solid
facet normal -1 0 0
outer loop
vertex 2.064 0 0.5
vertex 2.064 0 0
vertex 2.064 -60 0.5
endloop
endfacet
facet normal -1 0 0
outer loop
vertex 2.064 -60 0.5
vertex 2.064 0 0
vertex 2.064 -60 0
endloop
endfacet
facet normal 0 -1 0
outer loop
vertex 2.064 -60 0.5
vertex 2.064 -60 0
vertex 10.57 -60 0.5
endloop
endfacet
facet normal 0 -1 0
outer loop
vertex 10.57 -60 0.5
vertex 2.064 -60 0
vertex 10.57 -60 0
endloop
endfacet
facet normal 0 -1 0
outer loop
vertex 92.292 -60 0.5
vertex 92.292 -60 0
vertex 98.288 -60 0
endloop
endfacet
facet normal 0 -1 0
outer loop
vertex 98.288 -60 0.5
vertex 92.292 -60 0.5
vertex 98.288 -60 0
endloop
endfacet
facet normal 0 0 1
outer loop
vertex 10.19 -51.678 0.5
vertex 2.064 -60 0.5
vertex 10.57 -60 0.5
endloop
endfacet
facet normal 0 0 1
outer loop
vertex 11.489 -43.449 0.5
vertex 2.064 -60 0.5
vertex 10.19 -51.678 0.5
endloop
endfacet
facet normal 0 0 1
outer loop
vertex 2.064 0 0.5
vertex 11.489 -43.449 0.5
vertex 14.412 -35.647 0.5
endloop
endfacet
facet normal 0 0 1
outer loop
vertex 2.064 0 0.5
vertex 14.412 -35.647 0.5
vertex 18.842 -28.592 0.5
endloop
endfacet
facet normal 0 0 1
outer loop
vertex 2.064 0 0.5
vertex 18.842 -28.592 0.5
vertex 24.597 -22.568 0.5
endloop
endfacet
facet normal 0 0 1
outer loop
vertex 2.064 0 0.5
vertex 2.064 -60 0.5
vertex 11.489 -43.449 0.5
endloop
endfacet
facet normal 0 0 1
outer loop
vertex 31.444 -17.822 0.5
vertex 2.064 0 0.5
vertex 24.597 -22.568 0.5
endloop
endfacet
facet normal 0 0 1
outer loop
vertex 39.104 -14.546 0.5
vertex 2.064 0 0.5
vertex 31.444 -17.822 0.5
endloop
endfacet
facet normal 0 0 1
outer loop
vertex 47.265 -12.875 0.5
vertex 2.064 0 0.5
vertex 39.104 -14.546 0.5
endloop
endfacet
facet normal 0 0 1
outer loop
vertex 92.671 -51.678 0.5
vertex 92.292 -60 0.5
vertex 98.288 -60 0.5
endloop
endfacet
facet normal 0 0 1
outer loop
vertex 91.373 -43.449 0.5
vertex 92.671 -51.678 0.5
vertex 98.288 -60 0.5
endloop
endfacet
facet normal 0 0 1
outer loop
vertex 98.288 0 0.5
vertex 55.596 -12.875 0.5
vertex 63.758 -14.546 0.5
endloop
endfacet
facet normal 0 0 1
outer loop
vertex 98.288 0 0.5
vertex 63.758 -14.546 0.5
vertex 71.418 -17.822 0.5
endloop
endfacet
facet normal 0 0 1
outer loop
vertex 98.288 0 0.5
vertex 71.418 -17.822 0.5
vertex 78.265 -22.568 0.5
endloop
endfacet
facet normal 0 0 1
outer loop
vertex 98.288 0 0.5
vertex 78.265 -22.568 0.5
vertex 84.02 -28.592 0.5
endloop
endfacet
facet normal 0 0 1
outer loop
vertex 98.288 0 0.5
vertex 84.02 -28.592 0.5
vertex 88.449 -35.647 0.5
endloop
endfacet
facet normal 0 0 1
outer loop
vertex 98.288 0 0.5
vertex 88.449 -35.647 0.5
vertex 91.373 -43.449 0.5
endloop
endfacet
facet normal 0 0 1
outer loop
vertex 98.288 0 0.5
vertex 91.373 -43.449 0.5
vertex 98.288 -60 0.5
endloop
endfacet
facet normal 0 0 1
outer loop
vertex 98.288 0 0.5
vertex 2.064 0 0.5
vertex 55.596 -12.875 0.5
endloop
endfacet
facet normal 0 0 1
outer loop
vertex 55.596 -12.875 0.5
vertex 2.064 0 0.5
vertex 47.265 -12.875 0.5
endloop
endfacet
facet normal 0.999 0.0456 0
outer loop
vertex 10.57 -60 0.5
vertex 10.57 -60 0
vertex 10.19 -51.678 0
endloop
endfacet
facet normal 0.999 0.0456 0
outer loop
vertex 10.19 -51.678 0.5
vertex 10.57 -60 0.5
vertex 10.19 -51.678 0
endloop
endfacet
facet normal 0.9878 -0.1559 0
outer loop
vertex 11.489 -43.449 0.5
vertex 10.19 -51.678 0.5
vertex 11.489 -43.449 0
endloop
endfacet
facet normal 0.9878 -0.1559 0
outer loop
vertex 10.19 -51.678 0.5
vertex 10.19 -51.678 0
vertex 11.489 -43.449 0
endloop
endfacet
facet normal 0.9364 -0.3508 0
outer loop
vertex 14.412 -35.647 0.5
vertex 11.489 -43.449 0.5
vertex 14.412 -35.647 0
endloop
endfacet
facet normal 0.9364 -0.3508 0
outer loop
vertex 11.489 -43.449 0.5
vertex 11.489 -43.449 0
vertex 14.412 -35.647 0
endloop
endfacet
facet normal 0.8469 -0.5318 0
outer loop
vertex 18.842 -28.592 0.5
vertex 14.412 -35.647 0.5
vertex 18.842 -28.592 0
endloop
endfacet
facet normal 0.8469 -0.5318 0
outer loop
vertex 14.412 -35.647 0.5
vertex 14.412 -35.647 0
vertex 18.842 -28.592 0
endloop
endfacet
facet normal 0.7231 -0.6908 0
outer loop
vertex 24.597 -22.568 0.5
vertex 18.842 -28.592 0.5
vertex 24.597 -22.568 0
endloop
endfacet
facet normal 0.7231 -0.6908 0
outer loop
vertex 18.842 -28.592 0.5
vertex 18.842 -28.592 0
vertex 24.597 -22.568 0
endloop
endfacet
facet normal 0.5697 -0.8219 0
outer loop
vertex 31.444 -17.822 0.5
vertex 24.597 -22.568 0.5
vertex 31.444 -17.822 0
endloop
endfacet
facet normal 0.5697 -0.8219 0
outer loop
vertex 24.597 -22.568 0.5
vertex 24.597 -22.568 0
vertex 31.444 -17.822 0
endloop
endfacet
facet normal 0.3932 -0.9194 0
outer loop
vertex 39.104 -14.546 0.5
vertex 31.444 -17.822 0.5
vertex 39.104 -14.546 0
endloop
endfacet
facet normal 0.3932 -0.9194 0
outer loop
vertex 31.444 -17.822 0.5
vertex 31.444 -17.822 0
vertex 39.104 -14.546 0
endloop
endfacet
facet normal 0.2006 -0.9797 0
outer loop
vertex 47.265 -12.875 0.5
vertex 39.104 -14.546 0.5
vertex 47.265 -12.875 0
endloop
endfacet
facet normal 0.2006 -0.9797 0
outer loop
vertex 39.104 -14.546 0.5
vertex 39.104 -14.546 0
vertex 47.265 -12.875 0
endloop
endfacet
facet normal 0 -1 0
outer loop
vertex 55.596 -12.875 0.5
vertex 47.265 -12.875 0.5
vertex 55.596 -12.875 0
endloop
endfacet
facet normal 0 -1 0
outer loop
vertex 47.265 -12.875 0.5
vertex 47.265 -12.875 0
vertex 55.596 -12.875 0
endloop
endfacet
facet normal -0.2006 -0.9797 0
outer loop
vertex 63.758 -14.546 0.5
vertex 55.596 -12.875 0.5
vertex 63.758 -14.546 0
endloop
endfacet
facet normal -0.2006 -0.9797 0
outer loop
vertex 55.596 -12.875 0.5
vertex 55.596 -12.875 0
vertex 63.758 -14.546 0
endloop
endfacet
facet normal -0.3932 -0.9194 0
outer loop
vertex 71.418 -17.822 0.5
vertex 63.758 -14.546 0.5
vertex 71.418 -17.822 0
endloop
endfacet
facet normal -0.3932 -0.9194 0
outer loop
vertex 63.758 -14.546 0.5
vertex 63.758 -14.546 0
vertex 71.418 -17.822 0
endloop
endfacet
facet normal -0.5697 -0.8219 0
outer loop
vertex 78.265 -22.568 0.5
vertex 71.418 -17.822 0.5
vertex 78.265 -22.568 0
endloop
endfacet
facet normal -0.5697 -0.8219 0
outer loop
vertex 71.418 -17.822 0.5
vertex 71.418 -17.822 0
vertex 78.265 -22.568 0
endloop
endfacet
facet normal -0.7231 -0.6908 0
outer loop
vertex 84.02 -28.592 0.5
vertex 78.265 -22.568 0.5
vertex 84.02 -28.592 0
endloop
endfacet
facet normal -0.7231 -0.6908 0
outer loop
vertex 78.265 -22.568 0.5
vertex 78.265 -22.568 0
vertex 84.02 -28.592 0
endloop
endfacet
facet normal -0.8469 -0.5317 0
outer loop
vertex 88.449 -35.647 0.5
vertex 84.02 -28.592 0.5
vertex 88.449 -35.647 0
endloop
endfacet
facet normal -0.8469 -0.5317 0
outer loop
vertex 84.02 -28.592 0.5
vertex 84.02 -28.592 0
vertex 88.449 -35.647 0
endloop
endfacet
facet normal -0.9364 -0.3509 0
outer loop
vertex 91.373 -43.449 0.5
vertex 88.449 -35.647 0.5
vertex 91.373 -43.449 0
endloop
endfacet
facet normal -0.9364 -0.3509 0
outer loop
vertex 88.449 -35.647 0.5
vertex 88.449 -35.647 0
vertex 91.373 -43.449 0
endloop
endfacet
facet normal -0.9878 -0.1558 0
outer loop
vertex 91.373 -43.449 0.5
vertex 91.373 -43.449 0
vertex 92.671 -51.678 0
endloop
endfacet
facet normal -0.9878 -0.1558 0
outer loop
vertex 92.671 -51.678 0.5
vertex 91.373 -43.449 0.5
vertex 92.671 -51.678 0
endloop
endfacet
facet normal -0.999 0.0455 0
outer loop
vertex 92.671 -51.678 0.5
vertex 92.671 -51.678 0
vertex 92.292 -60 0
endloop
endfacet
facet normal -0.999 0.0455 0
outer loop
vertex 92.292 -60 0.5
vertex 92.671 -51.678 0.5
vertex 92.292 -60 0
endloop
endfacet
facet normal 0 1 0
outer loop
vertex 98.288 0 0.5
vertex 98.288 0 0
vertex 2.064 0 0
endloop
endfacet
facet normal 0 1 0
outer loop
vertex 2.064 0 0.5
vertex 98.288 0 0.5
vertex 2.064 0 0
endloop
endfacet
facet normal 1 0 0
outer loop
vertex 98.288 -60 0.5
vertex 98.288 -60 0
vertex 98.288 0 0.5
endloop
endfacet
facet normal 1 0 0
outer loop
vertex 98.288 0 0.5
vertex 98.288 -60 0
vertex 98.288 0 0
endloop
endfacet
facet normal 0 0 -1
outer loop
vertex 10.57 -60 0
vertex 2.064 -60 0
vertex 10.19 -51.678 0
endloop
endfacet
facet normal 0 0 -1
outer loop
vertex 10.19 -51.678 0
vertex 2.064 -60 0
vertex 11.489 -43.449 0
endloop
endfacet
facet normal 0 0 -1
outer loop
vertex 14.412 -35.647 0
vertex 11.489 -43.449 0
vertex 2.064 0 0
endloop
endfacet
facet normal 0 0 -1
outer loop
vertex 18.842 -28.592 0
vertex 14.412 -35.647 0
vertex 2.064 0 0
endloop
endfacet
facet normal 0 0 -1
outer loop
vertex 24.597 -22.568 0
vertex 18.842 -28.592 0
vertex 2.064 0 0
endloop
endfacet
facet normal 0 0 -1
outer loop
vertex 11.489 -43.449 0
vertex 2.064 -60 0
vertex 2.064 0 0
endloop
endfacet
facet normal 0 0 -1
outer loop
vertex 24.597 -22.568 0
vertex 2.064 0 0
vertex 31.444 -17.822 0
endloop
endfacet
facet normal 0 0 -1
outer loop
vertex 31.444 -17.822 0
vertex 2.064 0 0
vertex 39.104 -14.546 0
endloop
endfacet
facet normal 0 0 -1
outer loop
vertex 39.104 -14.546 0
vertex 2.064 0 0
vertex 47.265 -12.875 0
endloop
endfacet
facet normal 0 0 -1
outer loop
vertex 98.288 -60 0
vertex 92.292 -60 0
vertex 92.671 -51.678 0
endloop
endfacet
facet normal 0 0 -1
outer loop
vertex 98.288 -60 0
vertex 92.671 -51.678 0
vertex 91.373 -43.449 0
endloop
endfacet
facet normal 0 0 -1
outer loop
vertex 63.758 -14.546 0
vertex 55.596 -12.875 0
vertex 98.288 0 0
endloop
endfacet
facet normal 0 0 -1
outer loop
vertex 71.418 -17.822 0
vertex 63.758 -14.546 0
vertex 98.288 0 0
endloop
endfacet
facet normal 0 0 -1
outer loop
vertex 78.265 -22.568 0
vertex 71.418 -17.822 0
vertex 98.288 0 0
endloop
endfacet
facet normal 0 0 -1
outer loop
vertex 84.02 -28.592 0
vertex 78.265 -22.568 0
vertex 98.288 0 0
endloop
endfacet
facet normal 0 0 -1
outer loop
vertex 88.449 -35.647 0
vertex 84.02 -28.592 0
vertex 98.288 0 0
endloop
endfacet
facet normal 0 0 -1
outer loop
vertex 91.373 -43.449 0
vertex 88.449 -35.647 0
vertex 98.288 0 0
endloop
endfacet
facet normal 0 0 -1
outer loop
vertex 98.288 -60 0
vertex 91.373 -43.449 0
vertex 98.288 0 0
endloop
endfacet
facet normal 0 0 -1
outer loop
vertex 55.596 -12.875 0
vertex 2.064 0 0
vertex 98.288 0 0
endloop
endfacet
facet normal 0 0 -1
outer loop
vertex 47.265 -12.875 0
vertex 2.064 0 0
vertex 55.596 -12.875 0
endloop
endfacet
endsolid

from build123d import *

# Parameters (mm, degrees)
EXTRUDE_1_DEPTH = 0.5


with BuildPart() as part:
    # Эскиз1 → Вытянуть1 (new body)
    with BuildSketch(Plane.XY):
        with BuildLine():
            Line((2.063762187, -60), (10.569656745, -60))
            ThreePointArc((10.569656745, -60), (51.430925196, -12.664111557), (92.292193648, -60))
            Line((92.292193648, -60), (98.287869977, -60))
            Line((98.287869977, -60), (98.287869977, 0))
            Line((98.287869977, 0), (2.063762187, 0))
            Line((2.063762187, 0), (2.063762187, -60))
        make_face()
    extrude(amount=EXTRUDE_1_DEPTH)


solid = part.part
